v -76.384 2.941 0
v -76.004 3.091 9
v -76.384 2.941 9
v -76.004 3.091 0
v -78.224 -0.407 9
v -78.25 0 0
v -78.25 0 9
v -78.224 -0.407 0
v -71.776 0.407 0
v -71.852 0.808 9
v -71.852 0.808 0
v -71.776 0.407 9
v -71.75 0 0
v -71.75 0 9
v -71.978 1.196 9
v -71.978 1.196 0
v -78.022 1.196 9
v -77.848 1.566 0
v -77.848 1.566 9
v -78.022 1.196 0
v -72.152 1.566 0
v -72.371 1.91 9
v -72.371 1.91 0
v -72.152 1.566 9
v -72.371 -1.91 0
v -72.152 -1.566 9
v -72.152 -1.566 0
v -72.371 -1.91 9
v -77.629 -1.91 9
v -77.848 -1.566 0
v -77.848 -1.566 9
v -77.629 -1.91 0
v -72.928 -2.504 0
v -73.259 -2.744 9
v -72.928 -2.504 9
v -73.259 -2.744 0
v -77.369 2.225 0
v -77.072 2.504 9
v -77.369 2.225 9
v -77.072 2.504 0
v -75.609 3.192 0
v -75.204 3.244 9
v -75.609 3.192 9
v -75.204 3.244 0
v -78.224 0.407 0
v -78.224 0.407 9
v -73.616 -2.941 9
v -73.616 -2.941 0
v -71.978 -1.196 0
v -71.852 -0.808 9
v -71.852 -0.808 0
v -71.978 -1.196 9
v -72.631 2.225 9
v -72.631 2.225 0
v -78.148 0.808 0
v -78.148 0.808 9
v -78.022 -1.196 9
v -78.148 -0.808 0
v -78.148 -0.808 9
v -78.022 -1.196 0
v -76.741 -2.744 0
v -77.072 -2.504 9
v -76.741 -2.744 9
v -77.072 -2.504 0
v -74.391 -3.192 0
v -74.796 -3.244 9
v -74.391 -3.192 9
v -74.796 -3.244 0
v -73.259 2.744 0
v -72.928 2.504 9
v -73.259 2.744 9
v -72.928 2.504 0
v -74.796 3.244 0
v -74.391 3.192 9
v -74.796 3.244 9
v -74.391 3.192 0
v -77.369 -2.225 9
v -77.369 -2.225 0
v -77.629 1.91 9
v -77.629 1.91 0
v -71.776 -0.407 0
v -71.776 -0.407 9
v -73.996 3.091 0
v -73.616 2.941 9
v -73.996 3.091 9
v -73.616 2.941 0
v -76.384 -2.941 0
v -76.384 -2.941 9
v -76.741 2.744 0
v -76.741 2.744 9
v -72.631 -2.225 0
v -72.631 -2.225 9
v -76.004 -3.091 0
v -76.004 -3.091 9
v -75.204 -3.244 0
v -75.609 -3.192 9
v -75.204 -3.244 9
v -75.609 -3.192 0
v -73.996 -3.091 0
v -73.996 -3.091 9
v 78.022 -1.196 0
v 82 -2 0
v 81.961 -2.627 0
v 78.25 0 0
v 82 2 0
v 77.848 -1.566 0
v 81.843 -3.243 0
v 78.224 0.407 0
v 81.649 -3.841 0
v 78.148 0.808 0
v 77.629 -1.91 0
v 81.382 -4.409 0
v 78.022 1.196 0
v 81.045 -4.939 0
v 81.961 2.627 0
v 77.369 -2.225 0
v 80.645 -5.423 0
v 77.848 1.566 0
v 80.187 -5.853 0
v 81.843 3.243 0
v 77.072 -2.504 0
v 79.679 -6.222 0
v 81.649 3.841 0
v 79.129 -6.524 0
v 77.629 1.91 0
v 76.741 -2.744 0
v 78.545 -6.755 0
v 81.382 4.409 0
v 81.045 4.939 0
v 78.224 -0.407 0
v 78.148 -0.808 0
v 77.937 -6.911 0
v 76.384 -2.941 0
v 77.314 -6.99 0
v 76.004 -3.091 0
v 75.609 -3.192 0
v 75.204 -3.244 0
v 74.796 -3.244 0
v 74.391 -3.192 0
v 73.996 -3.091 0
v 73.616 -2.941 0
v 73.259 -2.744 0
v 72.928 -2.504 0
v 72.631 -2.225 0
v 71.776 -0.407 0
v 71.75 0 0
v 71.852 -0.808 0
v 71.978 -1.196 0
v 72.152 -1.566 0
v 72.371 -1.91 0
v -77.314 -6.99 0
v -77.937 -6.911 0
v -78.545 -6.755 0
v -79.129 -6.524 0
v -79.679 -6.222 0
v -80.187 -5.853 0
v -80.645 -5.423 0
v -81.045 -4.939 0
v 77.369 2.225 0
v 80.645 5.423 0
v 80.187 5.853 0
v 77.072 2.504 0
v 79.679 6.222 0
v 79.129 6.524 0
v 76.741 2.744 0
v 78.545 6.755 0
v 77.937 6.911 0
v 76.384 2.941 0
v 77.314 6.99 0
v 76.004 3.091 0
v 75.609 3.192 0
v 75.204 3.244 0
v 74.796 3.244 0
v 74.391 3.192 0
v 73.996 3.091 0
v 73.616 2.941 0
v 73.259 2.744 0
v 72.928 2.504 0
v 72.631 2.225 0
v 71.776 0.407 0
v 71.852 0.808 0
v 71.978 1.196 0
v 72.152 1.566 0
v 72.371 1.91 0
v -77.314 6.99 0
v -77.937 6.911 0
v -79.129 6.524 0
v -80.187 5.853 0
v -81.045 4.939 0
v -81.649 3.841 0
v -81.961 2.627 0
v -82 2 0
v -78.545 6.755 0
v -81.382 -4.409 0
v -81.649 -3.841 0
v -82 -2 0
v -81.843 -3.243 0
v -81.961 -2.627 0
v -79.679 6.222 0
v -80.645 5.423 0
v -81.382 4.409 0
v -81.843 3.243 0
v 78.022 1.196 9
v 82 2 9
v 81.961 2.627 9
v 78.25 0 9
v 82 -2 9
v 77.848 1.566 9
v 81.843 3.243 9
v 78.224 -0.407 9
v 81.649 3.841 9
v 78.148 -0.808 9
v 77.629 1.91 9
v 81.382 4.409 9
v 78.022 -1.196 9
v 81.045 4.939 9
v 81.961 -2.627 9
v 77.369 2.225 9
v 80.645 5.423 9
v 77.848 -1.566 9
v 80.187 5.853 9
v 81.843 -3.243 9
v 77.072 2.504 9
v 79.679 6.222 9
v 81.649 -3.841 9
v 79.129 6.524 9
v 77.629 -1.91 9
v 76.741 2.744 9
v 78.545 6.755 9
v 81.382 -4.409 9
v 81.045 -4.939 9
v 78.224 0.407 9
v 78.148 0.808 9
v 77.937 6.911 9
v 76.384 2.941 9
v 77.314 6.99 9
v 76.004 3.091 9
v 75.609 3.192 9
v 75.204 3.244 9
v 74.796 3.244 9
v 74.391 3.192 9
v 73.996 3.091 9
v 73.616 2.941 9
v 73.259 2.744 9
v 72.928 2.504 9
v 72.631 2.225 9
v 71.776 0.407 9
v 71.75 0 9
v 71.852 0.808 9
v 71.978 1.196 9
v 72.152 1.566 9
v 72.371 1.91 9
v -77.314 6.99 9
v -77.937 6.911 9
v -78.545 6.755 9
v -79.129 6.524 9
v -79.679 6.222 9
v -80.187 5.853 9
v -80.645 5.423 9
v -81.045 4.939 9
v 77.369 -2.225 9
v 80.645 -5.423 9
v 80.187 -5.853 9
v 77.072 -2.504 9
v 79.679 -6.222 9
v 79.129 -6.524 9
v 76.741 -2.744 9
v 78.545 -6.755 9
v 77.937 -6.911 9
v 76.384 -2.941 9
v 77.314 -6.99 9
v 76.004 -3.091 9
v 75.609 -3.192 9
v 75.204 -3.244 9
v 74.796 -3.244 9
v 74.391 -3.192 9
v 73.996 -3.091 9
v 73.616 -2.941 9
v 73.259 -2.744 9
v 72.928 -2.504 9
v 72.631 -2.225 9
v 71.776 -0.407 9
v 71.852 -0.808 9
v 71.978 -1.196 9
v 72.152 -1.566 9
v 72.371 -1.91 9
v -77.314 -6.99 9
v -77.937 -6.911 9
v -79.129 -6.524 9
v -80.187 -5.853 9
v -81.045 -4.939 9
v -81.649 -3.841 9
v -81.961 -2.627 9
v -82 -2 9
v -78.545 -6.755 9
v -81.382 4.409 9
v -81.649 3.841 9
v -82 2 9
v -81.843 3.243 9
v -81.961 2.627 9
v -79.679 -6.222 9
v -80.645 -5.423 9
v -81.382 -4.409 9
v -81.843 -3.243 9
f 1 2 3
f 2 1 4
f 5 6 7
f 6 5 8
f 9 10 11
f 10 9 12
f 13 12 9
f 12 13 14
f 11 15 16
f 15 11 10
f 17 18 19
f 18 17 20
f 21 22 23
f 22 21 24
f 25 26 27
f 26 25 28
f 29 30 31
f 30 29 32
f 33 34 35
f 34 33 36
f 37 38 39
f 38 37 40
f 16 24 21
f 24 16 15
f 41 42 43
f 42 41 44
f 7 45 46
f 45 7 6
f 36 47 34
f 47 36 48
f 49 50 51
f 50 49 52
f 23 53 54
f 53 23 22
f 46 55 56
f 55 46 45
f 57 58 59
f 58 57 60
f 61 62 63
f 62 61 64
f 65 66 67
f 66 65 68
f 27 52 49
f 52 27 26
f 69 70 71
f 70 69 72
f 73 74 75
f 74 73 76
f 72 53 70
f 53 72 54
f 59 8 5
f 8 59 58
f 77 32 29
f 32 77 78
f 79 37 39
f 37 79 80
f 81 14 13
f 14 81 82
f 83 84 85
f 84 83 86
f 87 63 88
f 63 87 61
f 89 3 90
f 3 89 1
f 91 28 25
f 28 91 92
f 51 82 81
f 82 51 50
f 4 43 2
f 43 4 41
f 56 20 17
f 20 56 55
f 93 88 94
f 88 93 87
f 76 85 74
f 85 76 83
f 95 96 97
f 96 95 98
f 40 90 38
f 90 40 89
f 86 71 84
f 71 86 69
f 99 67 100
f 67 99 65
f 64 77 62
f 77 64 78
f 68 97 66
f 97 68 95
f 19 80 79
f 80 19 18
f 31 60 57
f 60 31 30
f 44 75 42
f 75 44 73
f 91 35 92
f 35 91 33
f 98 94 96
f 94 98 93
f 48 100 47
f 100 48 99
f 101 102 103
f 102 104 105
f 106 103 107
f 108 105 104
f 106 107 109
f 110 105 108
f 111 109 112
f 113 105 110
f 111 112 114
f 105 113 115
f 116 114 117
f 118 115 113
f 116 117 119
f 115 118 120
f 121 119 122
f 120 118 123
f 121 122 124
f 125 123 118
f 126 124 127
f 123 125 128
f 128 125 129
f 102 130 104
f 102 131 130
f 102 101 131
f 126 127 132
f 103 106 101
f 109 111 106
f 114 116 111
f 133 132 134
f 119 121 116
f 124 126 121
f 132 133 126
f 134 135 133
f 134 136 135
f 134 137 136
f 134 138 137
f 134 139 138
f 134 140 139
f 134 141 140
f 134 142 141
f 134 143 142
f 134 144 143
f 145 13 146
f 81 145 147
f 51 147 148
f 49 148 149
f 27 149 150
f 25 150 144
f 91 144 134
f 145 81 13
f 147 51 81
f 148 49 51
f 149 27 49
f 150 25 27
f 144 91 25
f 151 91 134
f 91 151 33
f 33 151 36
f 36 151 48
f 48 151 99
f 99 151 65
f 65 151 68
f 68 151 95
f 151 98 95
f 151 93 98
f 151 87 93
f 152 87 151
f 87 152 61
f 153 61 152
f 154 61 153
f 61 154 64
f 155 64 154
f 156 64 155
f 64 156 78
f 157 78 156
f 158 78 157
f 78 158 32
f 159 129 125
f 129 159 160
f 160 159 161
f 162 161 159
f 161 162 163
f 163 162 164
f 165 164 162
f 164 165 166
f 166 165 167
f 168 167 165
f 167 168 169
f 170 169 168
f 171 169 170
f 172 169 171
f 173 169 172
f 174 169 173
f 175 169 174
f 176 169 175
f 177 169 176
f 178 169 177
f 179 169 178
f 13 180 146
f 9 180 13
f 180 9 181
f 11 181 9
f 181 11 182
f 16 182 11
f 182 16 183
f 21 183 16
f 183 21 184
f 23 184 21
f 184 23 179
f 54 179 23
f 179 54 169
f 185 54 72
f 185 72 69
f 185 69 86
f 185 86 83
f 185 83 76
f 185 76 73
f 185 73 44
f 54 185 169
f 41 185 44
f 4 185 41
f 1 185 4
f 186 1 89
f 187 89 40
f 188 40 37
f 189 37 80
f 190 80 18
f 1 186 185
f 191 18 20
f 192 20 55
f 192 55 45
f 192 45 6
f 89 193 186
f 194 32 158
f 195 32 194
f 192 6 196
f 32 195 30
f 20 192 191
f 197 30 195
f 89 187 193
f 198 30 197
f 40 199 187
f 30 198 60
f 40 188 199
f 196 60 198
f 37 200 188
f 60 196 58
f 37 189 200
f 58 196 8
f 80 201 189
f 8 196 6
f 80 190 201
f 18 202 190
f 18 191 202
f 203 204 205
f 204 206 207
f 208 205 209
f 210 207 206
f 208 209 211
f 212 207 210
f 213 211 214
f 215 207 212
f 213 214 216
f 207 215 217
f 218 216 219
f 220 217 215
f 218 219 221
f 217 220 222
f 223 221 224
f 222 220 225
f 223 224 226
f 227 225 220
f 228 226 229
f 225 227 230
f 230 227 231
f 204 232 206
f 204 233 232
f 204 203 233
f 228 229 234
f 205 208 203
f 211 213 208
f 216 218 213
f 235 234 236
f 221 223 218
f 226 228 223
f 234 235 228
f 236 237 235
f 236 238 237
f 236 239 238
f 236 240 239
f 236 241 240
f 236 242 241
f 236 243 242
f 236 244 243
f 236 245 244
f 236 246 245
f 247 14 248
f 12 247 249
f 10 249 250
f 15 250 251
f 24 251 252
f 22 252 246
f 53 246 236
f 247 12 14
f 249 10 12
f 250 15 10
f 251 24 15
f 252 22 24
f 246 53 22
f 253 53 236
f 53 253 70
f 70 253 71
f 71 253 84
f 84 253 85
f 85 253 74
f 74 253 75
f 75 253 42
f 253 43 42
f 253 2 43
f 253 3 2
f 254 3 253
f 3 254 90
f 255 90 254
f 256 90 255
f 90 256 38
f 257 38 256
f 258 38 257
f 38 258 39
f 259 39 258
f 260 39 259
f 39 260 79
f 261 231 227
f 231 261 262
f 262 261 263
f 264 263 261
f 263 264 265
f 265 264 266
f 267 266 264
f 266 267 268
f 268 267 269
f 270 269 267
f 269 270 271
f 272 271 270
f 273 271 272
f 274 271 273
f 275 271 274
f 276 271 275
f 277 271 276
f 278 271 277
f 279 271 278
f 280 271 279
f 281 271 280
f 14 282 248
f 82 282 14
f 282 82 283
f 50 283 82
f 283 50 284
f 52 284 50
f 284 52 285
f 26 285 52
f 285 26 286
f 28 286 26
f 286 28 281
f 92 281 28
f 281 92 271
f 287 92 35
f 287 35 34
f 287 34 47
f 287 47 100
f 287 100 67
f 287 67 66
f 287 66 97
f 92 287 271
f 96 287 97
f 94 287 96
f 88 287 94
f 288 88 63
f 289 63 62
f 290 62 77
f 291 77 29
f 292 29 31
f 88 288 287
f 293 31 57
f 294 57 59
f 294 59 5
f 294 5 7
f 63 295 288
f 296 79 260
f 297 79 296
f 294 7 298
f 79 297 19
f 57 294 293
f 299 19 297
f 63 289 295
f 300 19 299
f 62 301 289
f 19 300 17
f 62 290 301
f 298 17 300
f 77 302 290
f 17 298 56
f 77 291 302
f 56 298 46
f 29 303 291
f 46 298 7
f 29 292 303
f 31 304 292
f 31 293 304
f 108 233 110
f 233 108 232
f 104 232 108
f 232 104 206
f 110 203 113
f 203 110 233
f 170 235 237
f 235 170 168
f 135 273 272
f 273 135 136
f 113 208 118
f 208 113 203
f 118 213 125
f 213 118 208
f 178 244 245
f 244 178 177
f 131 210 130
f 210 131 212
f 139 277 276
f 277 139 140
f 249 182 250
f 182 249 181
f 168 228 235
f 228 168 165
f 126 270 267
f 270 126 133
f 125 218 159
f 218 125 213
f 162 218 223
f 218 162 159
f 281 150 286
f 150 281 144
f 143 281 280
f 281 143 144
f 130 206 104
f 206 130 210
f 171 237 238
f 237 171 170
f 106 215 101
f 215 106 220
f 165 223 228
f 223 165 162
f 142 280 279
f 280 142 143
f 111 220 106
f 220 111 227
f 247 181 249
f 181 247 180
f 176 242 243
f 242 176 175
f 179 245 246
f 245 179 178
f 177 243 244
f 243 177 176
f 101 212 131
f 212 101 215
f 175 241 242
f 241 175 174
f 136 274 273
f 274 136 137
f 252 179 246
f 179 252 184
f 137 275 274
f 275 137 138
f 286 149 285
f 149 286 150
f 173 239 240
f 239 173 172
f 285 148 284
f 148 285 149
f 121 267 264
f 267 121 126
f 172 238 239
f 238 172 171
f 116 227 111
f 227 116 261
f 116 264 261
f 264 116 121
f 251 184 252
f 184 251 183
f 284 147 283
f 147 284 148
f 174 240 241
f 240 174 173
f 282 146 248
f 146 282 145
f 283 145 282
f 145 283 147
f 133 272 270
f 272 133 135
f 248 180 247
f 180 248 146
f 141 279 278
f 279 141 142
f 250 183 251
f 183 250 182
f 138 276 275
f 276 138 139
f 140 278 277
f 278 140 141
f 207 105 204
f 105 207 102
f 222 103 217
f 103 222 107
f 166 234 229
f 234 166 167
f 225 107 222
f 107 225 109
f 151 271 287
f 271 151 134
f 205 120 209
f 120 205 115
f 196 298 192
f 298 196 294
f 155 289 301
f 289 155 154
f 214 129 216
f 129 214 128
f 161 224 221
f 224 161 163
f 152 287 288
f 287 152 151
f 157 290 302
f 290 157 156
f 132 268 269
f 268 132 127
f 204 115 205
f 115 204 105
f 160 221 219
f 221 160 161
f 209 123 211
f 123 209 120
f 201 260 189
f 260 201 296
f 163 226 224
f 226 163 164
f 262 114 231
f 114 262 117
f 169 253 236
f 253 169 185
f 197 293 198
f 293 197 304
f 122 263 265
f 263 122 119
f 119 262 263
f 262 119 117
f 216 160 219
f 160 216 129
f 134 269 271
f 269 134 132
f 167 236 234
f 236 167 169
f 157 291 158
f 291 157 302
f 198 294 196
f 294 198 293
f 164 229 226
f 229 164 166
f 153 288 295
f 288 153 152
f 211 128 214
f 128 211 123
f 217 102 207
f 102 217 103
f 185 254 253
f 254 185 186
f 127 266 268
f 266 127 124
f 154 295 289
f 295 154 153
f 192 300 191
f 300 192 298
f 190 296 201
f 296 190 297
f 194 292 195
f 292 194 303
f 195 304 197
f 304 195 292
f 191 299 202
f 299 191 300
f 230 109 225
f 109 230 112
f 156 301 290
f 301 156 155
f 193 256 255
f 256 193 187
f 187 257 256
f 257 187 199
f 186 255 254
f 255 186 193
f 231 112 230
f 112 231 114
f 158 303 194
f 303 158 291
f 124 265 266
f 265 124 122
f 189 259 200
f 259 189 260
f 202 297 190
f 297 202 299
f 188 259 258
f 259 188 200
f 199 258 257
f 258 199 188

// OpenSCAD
$fn = 50;


difference() {
	union() {
		hull() {
			translate(v = [-77.0000000000, 2.0000000000, 0]) {
				cylinder(h = 9, r = 5);
			}
			translate(v = [77.0000000000, 2.0000000000, 0]) {
				cylinder(h = 9, r = 5);
			}
			translate(v = [-77.0000000000, -2.0000000000, 0]) {
				cylinder(h = 9, r = 5);
			}
			translate(v = [77.0000000000, -2.0000000000, 0]) {
				cylinder(h = 9, r = 5);
			}
		}
	}
	union() {
		translate(v = [-75.0000000000, 0.0000000000, 0]) {
			cylinder(h = 9, r = 3.2500000000);
		}
		translate(v = [75.0000000000, 0.0000000000, 0]) {
			cylinder(h = 9, r = 3.2500000000);
		}
		translate(v = [-75.0000000000, 0.0000000000, 0]) {
			cylinder(h = 9, r = 1.8000000000);
		}
		translate(v = [75.0000000000, 0.0000000000, 0]) {
			cylinder(h = 9, r = 1.8000000000);
		}
		translate(v = [-75.0000000000, 0.0000000000, 0]) {
			cylinder(h = 9, r = 1.8000000000);
		}
		translate(v = [75.0000000000, 0.0000000000, 0]) {
			cylinder(h = 9, r = 1.8000000000);
		}
		translate(v = [-75.0000000000, 0.0000000000, 0]) {
			cylinder(h = 9, r = 1.8000000000);
		}
		translate(v = [75.0000000000, 0.0000000000, 0]) {
			cylinder(h = 9, r = 1.8000000000);
		}
	}
}
